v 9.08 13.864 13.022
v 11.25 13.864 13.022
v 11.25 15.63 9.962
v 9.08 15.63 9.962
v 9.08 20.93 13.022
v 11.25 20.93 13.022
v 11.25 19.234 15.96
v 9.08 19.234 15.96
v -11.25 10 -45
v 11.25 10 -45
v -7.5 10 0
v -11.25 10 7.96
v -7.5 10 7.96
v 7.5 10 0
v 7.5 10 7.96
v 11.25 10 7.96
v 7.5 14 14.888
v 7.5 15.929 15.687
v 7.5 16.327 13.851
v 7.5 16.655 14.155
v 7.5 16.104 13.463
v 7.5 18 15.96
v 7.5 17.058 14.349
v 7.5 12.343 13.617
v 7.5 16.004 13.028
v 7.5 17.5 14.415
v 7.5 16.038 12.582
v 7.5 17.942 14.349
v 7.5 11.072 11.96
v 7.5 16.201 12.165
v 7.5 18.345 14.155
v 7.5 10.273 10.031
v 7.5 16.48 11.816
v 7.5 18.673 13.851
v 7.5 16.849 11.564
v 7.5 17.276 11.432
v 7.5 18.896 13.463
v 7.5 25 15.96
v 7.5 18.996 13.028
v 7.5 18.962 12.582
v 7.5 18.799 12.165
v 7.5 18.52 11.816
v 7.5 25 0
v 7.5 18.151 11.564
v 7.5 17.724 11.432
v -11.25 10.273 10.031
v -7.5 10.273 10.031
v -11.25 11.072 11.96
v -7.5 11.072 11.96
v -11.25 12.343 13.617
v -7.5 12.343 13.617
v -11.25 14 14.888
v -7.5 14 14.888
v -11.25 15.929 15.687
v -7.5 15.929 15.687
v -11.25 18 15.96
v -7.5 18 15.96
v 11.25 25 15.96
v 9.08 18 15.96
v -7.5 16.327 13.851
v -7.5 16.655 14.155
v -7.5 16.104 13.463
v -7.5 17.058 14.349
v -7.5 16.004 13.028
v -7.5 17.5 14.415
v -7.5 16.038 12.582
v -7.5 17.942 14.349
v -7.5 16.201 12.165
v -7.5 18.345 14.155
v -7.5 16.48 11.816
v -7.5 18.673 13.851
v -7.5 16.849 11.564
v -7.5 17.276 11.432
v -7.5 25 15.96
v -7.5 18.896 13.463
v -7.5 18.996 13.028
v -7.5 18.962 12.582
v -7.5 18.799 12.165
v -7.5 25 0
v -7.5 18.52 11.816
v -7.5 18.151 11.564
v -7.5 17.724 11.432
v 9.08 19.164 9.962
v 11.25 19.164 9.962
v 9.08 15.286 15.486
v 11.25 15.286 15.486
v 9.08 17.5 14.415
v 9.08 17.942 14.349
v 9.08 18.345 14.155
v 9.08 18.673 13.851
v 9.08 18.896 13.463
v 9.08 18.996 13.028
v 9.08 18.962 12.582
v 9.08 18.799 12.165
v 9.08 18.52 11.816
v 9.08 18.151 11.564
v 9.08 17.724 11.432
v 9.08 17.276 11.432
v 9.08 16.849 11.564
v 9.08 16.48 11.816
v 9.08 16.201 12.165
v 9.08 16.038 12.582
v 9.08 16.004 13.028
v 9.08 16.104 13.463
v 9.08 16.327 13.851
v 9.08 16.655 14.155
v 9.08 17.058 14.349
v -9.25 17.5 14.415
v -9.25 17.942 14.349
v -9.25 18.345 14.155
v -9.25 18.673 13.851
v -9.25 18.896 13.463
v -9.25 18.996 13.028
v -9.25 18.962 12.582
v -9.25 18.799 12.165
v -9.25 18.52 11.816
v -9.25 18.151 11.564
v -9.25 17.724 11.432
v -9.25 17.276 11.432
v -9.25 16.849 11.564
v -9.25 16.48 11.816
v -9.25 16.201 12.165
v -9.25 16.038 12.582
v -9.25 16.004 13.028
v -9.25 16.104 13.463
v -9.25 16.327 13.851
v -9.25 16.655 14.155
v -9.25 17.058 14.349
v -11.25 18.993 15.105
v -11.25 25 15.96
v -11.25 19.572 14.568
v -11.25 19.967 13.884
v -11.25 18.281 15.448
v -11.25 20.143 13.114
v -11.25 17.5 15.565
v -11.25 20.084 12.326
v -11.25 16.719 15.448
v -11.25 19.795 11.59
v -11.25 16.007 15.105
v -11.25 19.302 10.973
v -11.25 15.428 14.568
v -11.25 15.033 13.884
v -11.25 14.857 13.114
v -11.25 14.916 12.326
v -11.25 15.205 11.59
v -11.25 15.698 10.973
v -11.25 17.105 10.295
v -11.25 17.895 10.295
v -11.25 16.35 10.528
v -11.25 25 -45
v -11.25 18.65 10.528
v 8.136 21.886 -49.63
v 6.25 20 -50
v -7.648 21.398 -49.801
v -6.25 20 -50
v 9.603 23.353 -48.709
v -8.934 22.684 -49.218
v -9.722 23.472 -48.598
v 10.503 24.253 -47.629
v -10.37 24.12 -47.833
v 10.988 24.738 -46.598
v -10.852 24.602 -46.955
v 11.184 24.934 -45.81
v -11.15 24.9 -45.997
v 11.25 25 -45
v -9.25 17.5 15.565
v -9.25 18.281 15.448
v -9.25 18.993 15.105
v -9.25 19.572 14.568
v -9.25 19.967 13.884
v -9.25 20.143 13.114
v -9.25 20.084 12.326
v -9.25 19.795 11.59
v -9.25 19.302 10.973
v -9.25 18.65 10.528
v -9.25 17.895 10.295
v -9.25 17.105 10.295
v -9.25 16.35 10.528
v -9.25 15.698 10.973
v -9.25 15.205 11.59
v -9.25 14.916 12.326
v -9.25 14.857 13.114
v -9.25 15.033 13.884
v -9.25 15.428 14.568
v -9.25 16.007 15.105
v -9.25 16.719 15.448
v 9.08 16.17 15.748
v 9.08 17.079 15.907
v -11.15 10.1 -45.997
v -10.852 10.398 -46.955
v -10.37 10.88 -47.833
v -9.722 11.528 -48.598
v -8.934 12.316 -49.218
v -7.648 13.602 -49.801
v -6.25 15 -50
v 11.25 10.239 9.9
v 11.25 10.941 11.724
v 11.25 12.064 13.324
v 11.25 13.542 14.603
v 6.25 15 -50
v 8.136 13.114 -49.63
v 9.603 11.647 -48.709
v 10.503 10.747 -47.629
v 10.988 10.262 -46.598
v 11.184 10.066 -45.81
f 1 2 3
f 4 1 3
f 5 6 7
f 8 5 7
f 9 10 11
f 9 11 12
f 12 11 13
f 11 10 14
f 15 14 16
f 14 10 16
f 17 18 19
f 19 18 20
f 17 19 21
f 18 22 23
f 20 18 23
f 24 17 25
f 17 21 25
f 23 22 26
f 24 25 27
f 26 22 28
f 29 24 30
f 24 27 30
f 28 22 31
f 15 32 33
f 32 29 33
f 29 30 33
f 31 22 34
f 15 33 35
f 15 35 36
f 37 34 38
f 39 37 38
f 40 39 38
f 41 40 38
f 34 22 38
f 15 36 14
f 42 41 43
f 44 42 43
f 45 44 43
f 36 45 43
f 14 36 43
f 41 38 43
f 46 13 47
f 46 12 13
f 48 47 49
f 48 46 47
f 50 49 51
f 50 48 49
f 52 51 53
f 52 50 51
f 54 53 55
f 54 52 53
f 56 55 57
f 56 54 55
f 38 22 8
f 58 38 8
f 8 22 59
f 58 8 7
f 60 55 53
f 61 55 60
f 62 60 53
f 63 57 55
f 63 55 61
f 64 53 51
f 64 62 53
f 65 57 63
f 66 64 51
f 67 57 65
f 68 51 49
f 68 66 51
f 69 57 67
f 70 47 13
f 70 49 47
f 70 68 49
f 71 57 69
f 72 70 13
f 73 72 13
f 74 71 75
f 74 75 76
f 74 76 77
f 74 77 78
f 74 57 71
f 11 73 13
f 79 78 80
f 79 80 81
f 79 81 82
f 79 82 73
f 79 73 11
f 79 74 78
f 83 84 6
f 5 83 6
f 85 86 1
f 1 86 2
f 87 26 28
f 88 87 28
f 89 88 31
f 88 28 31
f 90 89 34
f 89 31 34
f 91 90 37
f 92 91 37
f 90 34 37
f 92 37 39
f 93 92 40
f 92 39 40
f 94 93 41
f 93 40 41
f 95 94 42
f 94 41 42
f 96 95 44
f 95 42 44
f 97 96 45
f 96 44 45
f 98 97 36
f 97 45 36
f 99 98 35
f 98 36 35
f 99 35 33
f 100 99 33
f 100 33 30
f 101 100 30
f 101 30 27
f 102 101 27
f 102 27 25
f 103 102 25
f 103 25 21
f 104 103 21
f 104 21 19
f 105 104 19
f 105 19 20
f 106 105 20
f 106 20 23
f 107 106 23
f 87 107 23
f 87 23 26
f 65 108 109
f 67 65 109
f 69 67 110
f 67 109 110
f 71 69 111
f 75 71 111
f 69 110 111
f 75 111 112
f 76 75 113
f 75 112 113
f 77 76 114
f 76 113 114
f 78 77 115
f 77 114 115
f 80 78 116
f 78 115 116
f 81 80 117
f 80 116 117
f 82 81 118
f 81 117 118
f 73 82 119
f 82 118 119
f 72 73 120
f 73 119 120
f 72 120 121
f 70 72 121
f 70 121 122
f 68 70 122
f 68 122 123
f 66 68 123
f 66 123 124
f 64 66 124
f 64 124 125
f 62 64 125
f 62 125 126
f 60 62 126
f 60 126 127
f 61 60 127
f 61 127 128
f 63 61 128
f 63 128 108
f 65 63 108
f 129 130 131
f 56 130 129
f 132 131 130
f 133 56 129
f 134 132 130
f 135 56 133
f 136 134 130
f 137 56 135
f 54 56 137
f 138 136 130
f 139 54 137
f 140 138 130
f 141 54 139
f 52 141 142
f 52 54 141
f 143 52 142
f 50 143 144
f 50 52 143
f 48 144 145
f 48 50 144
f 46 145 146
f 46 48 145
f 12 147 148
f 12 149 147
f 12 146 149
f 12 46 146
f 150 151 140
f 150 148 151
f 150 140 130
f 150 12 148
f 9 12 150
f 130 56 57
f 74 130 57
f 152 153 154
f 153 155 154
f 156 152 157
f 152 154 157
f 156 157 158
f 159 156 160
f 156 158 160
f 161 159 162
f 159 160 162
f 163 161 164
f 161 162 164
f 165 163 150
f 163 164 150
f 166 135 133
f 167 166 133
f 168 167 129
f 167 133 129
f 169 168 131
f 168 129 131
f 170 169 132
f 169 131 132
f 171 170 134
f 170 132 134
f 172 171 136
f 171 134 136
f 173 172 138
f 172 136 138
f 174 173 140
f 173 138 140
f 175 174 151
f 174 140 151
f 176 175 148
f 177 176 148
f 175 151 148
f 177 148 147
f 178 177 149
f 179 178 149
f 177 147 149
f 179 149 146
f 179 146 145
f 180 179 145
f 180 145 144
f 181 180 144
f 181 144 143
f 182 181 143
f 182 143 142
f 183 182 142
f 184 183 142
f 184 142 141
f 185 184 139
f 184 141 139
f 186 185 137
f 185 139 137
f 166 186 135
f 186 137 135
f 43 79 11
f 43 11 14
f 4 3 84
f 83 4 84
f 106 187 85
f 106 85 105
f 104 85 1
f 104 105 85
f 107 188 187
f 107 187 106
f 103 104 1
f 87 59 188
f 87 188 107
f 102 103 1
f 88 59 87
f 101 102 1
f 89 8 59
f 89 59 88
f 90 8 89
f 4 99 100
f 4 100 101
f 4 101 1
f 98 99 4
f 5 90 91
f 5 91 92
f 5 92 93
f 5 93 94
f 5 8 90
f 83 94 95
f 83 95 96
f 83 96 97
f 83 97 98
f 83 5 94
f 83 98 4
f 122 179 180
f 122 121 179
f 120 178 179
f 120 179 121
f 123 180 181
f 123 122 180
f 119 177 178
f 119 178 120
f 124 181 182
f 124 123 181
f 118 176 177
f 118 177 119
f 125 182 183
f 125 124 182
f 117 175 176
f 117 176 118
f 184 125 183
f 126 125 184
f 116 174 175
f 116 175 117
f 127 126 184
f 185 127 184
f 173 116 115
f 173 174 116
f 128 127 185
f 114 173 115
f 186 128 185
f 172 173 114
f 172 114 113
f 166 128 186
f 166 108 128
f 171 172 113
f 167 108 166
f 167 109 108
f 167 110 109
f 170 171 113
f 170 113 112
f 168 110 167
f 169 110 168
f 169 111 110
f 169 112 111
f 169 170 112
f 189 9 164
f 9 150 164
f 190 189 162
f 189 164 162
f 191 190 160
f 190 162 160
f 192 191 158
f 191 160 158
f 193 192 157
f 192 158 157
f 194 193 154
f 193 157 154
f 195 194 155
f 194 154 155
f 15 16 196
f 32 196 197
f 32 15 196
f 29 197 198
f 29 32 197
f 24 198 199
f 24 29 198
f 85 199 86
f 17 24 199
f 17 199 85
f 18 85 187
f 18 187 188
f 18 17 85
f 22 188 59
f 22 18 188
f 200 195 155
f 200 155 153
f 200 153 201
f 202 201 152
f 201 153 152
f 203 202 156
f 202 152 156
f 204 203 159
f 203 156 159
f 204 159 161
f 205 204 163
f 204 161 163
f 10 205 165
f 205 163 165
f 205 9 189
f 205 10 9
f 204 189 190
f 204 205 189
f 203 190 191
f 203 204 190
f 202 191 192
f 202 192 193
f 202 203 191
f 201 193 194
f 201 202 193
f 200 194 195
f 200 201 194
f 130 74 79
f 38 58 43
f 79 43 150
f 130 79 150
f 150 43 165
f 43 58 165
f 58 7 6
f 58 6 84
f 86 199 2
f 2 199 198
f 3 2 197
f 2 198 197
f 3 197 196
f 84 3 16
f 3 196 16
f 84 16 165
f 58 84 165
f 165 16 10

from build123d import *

# Parameters (mm, degrees)
SKETCH1_W           = 22.5
SKETCH1_H           = 65.96
BOSS_EXTRUDE1_DEPTH = 35
SKETCH2_W           = 15
SKETCH2_H           = 15.96
CUT_EXTRUDE1_DEPTH  = 35
SKETCH4_R           = 1.5
CUT_EXTRUDE2_DEPTH  = 35
SKETCH5_R           = 2.65
CUT_EXTRUDE3_DEPTH  = 2
CUT_EXTRUDE4_DEPTH  = 2.17
CUT_EXTRUDE5_DEPTH  = 27.17
FILLET1_R           = 8
FILLET2_R           = 5


with BuildPart() as part:
    # Sketch1 → Boss-Extrude1 (new body)
    with BuildSketch(Plane(origin=(0, 0, 0), x_dir=(1, 0, 0), z_dir=(0, 1, 0))):
        with Locations((0, 17.02)):
            Rectangle(SKETCH1_W, SKETCH1_H)
    extrude(amount=BOSS_EXTRUDE1_DEPTH)

    # Sketch2 → Cut-Extrude1 (cut)
    with BuildSketch(Plane(origin=(0, 35, 0), x_dir=(1, 0, 0), z_dir=(0, 1, 0))):
        with Locations((0, -7.98)):
            Rectangle(SKETCH2_W, SKETCH2_H)
    extrude(amount=-CUT_EXTRUDE1_DEPTH, mode=Mode.SUBTRACT)

    # Sketch4 → Cut-Extrude2 (cut)
    with BuildSketch(Plane.ZY.offset(11.25)):
        with Locations((12.915476268, 17.5)):
            Circle(SKETCH4_R)
    extrude(amount=-CUT_EXTRUDE2_DEPTH, mode=Mode.SUBTRACT)

    # Sketch5 → Cut-Extrude3 (cut)
    with BuildSketch(Plane.ZY.offset(11.25)):
        with Locations((12.915476268, 17.5)):
            Circle(SKETCH5_R)
    extrude(amount=-CUT_EXTRUDE3_DEPTH, mode=Mode.SUBTRACT)

    # Sketch6 → Cut-Extrude4 (cut)
    with BuildSketch(Plane(origin=(11.25, 0, 0), x_dir=(0, 0, -1), z_dir=(1, 0, 0))):
        Polygon((-13.021785536, 13.863620316), (-9.961785536, 15.630312139), (-9.961785536, 19.163695787), (-13.021785536, 20.930387611), (-16.081785536, 19.163695787), (-16.081785536, 15.630312139), align=None)
    extrude(amount=-CUT_EXTRUDE4_DEPTH, mode=Mode.SUBTRACT)

    # Sketch7 → Cut-Extrude5 (cut)
    with BuildSketch(Plane(origin=(11.25, 0, 0), x_dir=(0, 0, -1), z_dir=(1, 0, 0))):
        Polygon((-15.96, 10), (-15.96, 0), (71.192312273, 0), (70.711592722, 35), (-15.96, 35), (-15.96, 25), (54.137148325, 25), (54.137148325, 10), align=None)
    extrude(amount=-CUT_EXTRUDE5_DEPTH, mode=Mode.SUBTRACT)

    # Fillet1
    fillet1_edges = [part.edges().sort_by_distance(p)[0] for p in [
        (9.375, 10, 15.96),
        (-9.375, 10, 15.96),
    ]]
    fillet(fillet1_edges, radius=FILLET1_R)

    # Fillet2
    fillet2_edges = [part.edges().sort_by_distance(p)[0] for p in [
        (11.25, 17.5, -50),
        (-11.25, 17.5, -50),
        (0, 10, -50),
        (0, 25, -50),
    ]]
    fillet(fillet2_edges, radius=FILLET2_R)


solid = part.part
